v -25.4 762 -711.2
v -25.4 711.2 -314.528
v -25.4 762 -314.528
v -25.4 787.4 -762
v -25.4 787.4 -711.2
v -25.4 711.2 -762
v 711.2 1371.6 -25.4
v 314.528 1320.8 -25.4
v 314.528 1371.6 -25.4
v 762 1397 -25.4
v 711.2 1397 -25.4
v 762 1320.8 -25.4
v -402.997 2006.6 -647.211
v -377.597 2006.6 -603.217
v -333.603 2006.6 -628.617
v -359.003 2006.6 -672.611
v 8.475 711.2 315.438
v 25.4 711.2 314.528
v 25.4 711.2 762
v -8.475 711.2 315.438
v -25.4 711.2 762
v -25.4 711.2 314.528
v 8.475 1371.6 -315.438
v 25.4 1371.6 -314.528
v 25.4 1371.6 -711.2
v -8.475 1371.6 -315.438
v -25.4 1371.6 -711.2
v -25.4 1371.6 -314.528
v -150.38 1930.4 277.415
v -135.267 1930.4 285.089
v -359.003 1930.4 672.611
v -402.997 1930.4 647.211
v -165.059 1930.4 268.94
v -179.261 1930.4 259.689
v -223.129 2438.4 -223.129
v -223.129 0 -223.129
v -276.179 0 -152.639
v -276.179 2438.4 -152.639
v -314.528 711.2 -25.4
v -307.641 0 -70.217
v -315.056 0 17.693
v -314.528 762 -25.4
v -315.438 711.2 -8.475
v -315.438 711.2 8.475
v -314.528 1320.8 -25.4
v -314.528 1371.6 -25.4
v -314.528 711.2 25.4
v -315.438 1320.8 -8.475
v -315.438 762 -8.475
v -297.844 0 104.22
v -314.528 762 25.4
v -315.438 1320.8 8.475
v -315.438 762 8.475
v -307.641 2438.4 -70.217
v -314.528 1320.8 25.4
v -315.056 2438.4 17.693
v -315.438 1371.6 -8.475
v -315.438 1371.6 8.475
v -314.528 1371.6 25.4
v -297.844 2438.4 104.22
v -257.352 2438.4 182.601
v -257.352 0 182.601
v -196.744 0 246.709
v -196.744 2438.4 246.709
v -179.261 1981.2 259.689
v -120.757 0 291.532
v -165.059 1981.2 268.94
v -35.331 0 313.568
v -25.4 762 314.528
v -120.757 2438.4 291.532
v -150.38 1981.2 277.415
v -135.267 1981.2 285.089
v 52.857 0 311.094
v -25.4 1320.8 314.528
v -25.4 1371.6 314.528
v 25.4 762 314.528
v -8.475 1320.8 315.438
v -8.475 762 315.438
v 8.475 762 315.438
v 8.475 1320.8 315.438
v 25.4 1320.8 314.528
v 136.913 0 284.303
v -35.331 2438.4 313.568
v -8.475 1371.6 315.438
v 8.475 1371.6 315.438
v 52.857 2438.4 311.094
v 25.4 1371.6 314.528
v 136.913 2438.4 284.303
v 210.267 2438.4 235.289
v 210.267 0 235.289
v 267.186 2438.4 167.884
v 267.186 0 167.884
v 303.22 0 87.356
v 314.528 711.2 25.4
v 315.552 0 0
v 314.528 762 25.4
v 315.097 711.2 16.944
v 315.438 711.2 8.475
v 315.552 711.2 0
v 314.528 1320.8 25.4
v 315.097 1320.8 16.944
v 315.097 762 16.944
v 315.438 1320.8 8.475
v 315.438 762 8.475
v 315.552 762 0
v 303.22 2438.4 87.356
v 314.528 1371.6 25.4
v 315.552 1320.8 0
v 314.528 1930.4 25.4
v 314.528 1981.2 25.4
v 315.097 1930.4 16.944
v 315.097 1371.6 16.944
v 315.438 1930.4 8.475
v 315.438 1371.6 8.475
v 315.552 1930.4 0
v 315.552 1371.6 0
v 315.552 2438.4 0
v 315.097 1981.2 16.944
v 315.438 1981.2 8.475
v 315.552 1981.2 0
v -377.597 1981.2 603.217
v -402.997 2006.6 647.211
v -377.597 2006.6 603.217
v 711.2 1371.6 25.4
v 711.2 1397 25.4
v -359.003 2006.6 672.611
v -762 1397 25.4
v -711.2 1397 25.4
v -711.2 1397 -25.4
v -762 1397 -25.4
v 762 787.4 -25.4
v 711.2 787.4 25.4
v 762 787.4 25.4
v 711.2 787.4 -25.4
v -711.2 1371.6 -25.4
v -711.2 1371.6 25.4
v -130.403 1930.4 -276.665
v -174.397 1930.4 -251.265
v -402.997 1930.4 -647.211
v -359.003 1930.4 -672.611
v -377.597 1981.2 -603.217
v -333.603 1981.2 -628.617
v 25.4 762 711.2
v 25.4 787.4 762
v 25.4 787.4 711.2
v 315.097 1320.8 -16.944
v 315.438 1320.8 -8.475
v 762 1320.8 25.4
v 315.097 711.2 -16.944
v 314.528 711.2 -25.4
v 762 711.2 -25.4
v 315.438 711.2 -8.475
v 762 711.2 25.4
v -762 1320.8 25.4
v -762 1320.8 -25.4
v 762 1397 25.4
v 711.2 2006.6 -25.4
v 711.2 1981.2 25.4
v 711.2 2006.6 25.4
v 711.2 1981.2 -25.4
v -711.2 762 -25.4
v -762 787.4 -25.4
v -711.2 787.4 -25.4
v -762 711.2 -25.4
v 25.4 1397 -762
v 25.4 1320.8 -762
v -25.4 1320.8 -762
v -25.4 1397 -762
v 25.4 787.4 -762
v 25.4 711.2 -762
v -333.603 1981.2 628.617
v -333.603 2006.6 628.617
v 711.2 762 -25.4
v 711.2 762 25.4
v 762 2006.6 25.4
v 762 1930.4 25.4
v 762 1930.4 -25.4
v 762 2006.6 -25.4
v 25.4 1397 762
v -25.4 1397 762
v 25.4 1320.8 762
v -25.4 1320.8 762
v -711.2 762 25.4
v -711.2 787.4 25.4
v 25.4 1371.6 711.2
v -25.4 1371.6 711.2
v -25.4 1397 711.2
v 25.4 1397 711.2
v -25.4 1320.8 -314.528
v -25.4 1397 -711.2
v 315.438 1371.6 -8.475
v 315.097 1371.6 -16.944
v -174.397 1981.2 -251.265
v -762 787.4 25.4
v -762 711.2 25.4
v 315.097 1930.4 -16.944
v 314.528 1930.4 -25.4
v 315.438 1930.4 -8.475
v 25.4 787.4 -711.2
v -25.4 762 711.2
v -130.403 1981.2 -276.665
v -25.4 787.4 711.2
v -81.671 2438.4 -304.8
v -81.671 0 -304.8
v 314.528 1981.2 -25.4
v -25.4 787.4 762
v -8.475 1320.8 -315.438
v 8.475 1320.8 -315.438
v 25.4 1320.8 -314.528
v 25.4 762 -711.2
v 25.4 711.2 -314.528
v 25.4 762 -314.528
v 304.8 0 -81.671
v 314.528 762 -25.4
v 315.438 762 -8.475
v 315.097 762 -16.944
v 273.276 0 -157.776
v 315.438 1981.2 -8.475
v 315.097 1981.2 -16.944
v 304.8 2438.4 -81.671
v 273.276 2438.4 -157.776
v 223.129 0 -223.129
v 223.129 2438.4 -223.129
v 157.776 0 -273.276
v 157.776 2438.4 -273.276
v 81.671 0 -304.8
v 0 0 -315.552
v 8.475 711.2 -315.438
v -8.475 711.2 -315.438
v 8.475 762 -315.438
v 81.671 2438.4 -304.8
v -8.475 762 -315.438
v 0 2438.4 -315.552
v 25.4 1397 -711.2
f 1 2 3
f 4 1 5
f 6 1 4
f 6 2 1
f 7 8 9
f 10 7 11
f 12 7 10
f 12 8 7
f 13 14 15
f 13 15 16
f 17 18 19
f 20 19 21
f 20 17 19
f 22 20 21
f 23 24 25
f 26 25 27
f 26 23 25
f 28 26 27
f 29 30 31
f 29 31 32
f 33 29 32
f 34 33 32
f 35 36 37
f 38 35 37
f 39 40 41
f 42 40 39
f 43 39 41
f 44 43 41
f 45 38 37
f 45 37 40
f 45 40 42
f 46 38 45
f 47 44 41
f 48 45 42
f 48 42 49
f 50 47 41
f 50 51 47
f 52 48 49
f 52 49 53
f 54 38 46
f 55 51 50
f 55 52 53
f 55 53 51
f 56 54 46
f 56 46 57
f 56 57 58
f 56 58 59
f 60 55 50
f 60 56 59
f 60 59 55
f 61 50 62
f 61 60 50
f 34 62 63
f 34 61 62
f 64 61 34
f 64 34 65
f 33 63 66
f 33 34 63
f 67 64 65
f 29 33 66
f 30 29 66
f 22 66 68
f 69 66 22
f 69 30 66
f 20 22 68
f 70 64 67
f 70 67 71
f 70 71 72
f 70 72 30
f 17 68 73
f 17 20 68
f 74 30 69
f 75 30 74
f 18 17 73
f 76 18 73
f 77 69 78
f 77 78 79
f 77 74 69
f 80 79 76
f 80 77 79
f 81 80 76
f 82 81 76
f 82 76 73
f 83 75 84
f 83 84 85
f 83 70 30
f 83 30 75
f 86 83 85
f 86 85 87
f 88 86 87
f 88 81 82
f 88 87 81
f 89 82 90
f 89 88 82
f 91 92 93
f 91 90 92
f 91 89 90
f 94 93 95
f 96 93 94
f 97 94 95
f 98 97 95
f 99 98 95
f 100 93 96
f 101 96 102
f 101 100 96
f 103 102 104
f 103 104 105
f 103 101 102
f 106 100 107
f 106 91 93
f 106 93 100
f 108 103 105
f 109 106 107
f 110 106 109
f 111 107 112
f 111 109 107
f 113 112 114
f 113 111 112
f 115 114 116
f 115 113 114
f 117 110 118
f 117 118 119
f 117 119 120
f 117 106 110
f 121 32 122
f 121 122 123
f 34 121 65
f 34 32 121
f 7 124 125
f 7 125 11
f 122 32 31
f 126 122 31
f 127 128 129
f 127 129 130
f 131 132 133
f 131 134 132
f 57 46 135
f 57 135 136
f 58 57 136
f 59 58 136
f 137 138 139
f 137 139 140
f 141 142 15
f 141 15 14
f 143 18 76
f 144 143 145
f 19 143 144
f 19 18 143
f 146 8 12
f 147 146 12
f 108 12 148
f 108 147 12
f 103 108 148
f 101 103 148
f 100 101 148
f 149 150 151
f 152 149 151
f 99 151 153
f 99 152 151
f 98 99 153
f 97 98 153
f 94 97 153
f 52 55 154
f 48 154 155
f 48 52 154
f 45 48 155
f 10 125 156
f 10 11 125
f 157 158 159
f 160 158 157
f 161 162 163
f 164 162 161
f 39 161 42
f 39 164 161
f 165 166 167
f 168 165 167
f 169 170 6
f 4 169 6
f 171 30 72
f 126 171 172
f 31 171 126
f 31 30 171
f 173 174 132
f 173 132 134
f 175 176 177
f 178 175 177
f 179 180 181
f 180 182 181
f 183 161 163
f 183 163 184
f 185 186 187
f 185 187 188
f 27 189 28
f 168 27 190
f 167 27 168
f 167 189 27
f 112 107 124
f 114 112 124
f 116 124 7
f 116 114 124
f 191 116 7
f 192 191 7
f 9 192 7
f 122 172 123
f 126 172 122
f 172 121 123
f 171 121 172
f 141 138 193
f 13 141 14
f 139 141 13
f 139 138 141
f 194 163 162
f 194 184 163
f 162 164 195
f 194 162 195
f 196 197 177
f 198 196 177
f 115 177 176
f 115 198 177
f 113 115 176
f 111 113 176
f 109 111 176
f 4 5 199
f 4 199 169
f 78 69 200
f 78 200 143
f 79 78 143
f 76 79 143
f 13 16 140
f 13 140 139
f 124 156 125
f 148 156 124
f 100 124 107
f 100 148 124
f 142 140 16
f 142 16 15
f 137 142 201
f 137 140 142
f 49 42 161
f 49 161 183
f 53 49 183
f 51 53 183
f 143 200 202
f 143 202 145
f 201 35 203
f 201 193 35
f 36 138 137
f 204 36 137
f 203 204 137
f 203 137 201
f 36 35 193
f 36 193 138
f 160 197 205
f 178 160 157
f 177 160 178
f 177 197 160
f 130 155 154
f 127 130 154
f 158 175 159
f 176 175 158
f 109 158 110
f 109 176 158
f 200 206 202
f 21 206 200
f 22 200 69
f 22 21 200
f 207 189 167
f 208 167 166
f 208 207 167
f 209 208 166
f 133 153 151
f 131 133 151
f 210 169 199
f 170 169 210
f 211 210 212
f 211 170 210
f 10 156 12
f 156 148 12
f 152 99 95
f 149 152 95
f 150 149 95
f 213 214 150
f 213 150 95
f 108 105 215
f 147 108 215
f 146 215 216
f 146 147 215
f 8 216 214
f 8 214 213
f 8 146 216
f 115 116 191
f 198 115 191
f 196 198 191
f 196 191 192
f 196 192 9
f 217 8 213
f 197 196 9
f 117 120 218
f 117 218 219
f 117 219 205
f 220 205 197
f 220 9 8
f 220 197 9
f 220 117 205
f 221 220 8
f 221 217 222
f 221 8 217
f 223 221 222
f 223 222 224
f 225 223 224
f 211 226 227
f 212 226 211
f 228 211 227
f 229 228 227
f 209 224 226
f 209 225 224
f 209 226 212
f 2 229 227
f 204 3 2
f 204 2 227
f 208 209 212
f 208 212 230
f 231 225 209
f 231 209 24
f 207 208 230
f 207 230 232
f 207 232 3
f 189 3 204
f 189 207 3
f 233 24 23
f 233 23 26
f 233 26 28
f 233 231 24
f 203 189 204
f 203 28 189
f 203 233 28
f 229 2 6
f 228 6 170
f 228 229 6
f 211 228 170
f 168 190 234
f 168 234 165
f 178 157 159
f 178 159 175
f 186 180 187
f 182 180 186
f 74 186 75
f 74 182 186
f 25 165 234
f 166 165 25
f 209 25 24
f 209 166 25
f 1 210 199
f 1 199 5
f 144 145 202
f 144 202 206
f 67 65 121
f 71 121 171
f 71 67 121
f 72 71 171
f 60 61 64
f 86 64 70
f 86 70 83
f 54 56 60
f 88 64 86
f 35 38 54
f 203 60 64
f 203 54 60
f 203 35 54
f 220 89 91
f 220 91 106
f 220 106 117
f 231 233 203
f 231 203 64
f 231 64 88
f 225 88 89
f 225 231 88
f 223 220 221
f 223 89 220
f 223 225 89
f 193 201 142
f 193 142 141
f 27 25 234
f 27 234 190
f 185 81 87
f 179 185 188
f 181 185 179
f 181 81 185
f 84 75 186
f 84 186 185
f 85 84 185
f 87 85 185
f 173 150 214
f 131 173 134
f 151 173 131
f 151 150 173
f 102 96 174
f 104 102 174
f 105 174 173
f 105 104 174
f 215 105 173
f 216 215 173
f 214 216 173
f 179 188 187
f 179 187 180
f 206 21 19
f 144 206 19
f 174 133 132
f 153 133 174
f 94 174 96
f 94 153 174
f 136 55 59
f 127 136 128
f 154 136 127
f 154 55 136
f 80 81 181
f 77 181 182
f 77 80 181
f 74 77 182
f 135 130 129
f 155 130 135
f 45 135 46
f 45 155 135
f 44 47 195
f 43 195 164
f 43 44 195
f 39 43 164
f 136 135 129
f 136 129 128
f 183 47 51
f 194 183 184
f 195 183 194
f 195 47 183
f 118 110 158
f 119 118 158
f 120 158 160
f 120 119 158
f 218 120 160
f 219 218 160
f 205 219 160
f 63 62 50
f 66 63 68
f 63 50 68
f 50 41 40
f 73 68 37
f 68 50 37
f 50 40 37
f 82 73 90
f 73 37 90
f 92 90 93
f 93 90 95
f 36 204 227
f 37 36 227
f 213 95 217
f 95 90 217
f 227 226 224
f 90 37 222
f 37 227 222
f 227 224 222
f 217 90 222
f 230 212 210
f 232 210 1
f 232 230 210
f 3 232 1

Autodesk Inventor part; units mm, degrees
ref_plane "YZ Plane" through (0, 0, 0) normal (1, 0, 0) x (0, 1, 0)
ref_plane "XZ Plane" through (0, 0, 0) normal (0, 1, 0) x (-1, 0, 0)
ref_plane "XY Plane" through (0, 0, 0) normal (0, 0, 1) x (1, 0, 0)
sketch "Sketch1" plane through (0, 0, 0) normal (0, 1, 0) x (-1, 0, 0)
  line L0 (223.1291, -223.1291) -> (81.6709, -304.8)
  line L1 (81.6709, -304.8) -> (-81.6709, -304.8)
  line L2 (-81.6709, -304.8) -> (-223.1291, -223.1291)
  line L3 (-223.1291, -223.1291) -> (-304.8, -81.6709)
  line L4 (-304.8, -81.6709) -> (-304.8, 81.6709)
  line L5 (-304.8, 81.6709) -> (-223.1291, 223.1291)
  line L6 (-223.1291, 223.1291) -> (-81.6709, 304.8)
  line L7 (-81.6709, 304.8) -> (81.6709, 304.8)
  line L8 (81.6709, 304.8) -> (223.1291, 223.1291)
  line L9 (223.1291, 223.1291) -> (304.8, 81.6709)
  line L10 (304.8, 81.6709) -> (304.8, -81.6709)
  line L11 (304.8, -81.6709) -> (223.1291, -223.1291)
  point P0 (0, 0)
  point P1 (0, 0)
  dimension "d4" = 609.6
extrude "Extrusion1" add sketch "Sketch1" along normal blind 2438.4
sketch "Sketch2" plane through (304.8, 0, 81.6709) normal (1, 0, 0) x (0, 0, -1)
  line L0 (56.2709, 1981.2) -> (107.0709, 1981.2)
  line L1 (107.0709, 1981.2) -> (107.0709, 1930.4)
  line L2 (107.0709, 1930.4) -> (56.2709, 1930.4)
  line L3 (56.2709, 1930.4) -> (56.2709, 1981.2)
  line L4 (0, 2438.4) -> (163.3418, 2438.4) projected
  line L5 (163.3418, 2438.4) -> (0, 2438.4) projected
  line L6 (81.6709, 2438.4) -> (81.6709, 0) construction
  dimension "d5" = 457.2
  dimension "d6" = 50.8
extrude "Extrusion2" add sketch "Sketch2" along normal blind 457.2
sketch "Sketch3" plane through (304.8, 1981.2, 25.4) normal (0, 1, 0) x (1, 0, 0)
  line L0 (457.2, 0) -> (457.2, 50.8) projected
  line L1 (457.2, 0) -> (406.4, 0)
  line L2 (406.4, 0) -> (406.4, 50.8)
  line L3 (406.4, 50.8) -> (457.2, 50.8)
  line L4 (457.2, 50.8) -> (457.2, 0)
  point P0 (-304.8, 25.4)
extrude "Extrusion3" add sketch "Sketch3" along normal blind 25.4
pattern_linear "Rectangular Pattern1" count 3 spacing 609.6 along (0, -1, 0) of "Extrusion3", "Extrusion2"
pattern_circular "Circular Pattern1" count 3 over 360 about axis through (0, 2438.4, 0) along (0, 1, 0) of "Extrusion2", "Extrusion3"
pattern_circular "Circular Pattern2" count 4 over 360 about axis through (0, 2438.4, 0) along (0, 1, 0) of "Extrusion3", "Extrusion2", "Rectangular Pattern1"
sketch "Sketch4" plane through (0, 2438.4, 0) normal (0, 1, 0) x (1, 0, 0)
  line L0 (81.6709, 304.8) -> (-81.6709, 304.8)
  line L1 (-81.6709, 304.8) -> (-81.6709, 762)
  line L2 (-81.6709, 762) -> (81.6709, 762)
  line L3 (81.6709, 762) -> (81.6709, 304.8)
  line L4 (25.4, 762) -> (-25.4, 762) projected
  point P0 (0, 0)
extrude "Extrusion4" cut sketch "Sketch4" against normal blind 508
pattern_circular "Circular Pattern3" count 3 over 180 about axis through (0, 2438.4, 0) along (0, 1, 0) of "Extrusion4"
sketch "Sketch5" plane through (0, 2438.4, 0) normal (0, 1, 0) x (1, 0, 0)
  line L0 (-81.6709, 304.8) -> (-223.1291, 223.1291) projected
  circle A0 centre (0, 0) radius 315.5522
extrude "Extrusion5" add sketch "Sketch5" against normal blind 2438.4 contours A0 L0 picked at (-138.223, 29.6465)
properties part number "Central Coral"
